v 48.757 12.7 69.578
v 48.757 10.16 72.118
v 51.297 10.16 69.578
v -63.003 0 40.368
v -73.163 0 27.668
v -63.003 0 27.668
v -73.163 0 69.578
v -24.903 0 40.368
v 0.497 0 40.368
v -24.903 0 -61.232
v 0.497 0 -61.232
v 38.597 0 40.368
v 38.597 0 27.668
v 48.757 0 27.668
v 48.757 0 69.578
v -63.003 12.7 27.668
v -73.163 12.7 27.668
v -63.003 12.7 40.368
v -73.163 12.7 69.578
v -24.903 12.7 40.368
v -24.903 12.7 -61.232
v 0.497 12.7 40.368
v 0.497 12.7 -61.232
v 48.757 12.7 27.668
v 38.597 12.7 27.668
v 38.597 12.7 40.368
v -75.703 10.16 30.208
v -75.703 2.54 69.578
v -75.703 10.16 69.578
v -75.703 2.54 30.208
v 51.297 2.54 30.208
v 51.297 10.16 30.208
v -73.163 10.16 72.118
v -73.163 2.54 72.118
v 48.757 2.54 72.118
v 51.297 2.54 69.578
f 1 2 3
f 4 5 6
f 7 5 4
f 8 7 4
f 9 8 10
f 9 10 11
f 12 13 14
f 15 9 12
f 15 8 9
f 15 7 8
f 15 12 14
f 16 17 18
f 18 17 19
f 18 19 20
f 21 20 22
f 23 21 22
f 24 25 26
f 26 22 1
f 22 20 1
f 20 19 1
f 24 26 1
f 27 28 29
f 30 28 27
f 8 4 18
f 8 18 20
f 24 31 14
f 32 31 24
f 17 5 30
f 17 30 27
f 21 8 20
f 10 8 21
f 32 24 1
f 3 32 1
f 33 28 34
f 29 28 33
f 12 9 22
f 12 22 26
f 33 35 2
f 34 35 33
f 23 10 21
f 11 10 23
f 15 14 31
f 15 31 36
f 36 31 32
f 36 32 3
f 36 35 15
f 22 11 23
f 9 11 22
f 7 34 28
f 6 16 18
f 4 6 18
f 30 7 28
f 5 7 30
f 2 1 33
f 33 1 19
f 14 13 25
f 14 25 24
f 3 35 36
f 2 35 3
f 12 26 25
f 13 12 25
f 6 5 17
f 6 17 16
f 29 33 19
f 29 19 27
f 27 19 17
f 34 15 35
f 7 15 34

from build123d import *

# Parameters (mm, degrees)
F1_DEPTH = 12.7
F2_SIZE  = 2.54


with BuildPart() as f1:
    # F0 (on Front) → F1 (new body)
    with BuildSketch(Plane.XZ):
        Polygon((-24.902997, -61.232347), (0.497003, -61.232347), (0.497003, 40.367653), (38.597003, 40.367653), (38.597003, 27.667653), (51.297003, 27.667653), (51.297003, 72.117653), (-75.702997, 72.117653), (-75.702997, 27.667653), (-63.002997, 27.667653), (-63.002997, 40.367653), (-24.902997, 40.367653), align=None)
    extrude(amount=-F1_DEPTH)

    # F2
    f2_edges = [f1.edges().sort_by_distance(p)[0] for p in [
        (-12.202997, 0, 72.117653),
        (51.297003, 6.35, 72.117653),
        (-12.202997, 12.7, 72.117653),
        (-75.702997, 6.35, 72.117653),
        (51.297003, 6.35, 27.667653),
        (51.297003, 0, 49.892653),
        (51.297003, 12.7, 49.892653),
        (-75.702997, 6.35, 27.667653),
        (-75.702997, 0, 49.892653),
        (-75.702997, 12.7, 49.892653),
    ]]
    chamfer(f2_edges, length=F2_SIZE)


solid = f1.part
